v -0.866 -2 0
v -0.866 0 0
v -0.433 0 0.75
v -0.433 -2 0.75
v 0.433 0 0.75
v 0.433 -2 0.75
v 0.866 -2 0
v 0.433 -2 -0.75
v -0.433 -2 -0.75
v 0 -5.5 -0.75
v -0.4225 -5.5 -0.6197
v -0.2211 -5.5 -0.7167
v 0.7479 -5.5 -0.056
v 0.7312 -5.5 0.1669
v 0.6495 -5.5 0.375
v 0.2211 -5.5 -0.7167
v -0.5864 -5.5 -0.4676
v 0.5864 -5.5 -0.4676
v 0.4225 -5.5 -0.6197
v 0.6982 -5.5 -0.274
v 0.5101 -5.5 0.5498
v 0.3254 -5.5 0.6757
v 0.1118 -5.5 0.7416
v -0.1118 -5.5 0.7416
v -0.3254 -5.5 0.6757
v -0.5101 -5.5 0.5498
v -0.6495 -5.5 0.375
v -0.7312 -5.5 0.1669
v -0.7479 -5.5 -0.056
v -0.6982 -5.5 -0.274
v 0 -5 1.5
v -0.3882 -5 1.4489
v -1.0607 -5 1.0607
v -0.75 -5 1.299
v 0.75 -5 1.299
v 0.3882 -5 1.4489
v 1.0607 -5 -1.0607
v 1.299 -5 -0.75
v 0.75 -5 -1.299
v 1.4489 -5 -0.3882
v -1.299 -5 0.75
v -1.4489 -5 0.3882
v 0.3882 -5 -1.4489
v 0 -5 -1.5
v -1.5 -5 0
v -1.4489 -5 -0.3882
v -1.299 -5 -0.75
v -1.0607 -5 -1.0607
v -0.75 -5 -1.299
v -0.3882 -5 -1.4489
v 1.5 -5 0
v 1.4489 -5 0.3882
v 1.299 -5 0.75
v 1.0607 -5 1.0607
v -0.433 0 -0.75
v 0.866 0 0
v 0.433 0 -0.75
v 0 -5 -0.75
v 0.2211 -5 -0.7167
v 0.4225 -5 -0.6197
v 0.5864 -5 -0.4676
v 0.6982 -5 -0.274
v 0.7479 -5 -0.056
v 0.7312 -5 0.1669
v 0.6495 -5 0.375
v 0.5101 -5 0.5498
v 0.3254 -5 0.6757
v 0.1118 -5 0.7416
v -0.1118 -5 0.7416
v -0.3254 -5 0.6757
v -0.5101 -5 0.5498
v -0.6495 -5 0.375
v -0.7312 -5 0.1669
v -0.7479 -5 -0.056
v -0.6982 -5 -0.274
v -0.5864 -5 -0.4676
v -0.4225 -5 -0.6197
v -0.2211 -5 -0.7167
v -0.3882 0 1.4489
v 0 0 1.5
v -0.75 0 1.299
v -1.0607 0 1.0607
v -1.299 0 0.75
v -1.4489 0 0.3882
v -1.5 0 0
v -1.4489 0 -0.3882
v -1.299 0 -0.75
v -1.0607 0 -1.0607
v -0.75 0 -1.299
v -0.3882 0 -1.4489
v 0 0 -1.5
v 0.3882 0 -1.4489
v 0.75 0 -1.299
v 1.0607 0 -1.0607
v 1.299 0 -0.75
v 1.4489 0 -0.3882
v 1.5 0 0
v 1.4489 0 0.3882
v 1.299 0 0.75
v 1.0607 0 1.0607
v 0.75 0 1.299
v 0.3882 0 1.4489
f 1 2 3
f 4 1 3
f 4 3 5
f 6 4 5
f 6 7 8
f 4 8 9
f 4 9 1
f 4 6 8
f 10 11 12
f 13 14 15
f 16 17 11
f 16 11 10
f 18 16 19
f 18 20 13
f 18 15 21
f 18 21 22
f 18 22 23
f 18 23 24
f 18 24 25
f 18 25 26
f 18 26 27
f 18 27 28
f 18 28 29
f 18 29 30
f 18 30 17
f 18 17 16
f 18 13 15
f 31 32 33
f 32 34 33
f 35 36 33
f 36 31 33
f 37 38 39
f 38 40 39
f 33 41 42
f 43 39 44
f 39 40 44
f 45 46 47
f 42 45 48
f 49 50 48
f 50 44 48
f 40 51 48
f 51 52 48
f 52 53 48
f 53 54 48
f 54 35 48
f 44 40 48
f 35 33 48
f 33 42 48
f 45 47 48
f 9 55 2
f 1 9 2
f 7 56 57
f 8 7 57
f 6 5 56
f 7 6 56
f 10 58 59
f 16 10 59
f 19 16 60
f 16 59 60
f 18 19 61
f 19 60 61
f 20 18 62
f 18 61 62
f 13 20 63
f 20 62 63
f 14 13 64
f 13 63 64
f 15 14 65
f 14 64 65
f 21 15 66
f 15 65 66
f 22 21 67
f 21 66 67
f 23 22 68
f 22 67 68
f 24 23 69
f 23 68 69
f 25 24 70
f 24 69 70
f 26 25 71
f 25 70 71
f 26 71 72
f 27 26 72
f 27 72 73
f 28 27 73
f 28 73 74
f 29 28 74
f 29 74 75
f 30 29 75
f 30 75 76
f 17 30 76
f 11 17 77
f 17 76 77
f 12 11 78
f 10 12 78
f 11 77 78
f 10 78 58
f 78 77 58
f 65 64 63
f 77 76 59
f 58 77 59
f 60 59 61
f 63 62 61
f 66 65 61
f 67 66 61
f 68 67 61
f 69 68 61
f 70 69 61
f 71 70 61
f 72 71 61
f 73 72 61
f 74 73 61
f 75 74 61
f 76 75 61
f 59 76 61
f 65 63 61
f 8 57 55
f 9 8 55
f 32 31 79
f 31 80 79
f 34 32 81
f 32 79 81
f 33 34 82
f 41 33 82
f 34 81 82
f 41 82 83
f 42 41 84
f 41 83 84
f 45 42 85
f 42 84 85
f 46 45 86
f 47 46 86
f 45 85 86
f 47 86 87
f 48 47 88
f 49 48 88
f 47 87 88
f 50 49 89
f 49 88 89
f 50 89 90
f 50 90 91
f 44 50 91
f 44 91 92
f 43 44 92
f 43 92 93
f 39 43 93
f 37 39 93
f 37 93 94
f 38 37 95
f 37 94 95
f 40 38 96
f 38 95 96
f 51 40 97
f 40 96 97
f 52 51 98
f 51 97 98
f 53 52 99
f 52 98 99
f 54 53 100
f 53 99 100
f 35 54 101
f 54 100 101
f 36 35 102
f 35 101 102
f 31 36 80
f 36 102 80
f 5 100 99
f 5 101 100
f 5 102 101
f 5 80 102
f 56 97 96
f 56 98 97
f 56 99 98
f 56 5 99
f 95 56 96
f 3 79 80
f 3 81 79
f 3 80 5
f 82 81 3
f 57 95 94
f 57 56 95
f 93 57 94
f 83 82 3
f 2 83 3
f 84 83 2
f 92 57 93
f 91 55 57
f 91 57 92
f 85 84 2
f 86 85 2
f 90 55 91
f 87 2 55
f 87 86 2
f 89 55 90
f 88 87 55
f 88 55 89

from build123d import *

# Parameters (mm, degrees)
SKETCH1_W           = 1.5
SKETCH1_H           = 5
SKETCH3_R           = 0.75
BOSS_EXTRUDE1_DEPTH = 0.5
CUT_EXTRUDE1_DEPTH  = 2


with BuildPart() as part:
    # Sketch1 → Revolve1 (revolve)
    with BuildSketch(Plane.XY, mode=Mode.PRIVATE) as revolve1_sk:
        with Locations((0.75, -2.5)):
            Rectangle(SKETCH1_W, SKETCH1_H)
    revolve(revolve1_sk.sketch.rotate(Axis((0, 61.691642626, 0), (0, -1, 0)), 90), axis=Axis((0, 61.691642626, 0), (0, -1, 0)))

    # Sketch2 → Cut-Extrude1 (cut)
    with BuildSketch(Plane(origin=(0, 0, 0), x_dir=(-1, 0, 0), z_dir=(0, 1, 0))):
        Polygon((-0.433012702, -0.75), (0.433012702, -0.75), (0.866025404, 0), (0.433012702, 0.75), (-0.433012702, 0.75), (-0.866025404, 0), align=None)
    extrude(amount=-CUT_EXTRUDE1_DEPTH, mode=Mode.SUBTRACT)


with BuildPart() as body_2:
    # Sketch3 → Boss-Extrude1 (new body)
    with BuildSketch(Plane.XZ.offset(5)):
        with Locations(Location((0, 0, 0), (0, 0, 270))):
            Circle(SKETCH3_R)
    extrude(amount=BOSS_EXTRUDE1_DEPTH)


solid = Compound([part.part, body_2.part])
